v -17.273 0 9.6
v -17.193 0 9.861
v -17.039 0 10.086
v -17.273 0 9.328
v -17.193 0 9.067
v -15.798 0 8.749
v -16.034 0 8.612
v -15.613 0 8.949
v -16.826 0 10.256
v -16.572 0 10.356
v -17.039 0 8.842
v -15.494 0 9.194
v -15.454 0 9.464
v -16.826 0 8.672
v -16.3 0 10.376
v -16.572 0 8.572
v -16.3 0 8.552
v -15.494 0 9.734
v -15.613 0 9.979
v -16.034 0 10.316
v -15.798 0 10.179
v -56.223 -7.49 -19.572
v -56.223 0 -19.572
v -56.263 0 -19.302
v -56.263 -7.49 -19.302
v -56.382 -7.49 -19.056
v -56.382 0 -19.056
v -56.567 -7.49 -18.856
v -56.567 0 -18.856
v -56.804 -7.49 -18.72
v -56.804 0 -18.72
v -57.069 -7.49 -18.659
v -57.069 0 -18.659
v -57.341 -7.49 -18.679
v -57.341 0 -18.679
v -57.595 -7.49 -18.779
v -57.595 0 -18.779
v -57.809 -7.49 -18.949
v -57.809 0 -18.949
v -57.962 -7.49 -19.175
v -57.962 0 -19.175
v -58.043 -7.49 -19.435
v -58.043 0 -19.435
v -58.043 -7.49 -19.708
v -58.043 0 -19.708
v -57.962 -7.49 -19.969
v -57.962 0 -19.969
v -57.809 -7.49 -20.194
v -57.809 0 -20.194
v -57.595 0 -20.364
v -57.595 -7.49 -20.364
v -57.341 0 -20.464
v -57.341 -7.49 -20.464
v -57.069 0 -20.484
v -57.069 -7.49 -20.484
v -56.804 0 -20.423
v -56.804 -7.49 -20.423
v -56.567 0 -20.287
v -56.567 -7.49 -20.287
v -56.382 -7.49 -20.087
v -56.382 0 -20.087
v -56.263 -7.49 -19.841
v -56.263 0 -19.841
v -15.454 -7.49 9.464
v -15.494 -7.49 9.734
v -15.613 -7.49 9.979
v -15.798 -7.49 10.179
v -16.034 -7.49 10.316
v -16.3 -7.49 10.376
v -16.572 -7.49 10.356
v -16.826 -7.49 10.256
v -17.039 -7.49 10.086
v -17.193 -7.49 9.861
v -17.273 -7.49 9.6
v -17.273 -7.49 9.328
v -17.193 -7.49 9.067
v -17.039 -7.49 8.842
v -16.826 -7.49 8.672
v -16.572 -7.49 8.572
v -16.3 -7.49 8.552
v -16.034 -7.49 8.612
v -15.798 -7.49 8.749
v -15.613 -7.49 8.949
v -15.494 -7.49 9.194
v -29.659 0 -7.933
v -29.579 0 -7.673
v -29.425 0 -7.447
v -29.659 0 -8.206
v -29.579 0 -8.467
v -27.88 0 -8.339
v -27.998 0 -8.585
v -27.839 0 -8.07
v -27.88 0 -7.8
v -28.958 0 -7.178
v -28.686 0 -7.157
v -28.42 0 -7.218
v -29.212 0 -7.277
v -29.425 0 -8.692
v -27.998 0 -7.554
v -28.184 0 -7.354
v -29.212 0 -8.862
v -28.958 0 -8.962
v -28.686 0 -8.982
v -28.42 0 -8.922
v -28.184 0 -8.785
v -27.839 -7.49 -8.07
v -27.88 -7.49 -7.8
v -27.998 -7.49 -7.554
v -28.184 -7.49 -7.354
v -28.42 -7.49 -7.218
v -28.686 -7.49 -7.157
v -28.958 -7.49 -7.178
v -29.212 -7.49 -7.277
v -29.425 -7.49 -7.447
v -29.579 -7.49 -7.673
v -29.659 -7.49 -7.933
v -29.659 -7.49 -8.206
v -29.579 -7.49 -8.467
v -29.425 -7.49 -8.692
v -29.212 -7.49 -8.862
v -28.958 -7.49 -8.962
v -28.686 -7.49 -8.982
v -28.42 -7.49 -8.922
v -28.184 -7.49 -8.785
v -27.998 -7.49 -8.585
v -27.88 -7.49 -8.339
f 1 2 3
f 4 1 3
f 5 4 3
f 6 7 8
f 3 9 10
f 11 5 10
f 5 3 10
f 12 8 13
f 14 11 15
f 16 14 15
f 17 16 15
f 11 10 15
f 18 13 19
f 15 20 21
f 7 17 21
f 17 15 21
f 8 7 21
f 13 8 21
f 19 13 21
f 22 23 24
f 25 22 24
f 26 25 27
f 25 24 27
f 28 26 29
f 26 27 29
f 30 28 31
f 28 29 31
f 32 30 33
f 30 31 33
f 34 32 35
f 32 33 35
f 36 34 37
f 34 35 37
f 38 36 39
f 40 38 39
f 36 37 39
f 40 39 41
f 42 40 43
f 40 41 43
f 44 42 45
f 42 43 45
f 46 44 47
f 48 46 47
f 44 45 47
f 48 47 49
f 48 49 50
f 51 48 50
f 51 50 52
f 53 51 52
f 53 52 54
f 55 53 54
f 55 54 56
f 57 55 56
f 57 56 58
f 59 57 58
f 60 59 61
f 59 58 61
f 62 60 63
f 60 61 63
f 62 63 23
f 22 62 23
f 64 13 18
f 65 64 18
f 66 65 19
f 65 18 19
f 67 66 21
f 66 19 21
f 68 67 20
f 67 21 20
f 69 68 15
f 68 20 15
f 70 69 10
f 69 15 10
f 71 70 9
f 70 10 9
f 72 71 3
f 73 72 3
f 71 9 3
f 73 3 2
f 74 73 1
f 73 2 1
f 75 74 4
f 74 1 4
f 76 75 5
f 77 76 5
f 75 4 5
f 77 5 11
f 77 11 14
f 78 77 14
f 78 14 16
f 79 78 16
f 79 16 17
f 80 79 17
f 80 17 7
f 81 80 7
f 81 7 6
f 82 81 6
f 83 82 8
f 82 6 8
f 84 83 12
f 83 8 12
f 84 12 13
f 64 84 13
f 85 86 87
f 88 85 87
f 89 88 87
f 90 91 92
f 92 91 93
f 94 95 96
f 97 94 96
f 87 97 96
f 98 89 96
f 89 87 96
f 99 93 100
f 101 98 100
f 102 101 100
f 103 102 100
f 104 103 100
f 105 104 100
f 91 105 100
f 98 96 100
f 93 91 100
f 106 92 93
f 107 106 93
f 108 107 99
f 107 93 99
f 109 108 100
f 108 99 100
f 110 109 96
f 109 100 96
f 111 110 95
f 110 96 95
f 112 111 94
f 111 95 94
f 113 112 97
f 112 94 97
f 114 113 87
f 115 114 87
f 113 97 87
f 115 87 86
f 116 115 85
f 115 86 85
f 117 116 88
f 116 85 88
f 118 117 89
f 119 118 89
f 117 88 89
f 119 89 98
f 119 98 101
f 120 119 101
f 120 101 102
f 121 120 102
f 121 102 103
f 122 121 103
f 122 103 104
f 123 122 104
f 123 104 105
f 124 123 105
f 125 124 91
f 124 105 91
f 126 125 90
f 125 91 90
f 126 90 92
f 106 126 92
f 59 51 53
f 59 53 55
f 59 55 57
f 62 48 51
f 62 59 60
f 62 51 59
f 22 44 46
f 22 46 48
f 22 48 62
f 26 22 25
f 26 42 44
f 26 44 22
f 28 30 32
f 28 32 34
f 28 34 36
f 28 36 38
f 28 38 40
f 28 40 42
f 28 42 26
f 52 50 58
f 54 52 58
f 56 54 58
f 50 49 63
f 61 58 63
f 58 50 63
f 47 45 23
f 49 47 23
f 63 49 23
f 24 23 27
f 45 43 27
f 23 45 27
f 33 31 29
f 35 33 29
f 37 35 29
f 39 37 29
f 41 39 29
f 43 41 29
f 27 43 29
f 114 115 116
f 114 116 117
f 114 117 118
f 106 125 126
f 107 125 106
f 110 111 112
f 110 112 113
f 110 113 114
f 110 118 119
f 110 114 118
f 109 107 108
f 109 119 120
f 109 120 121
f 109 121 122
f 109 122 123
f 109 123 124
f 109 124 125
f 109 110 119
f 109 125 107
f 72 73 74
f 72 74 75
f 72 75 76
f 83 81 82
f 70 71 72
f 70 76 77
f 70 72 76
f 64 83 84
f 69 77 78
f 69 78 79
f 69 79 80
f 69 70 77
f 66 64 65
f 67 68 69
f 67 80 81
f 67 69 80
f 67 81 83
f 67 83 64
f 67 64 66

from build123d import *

# Parameters (mm, degrees)
F0_R     = 0.915
F1_DEPTH = 7.49
F2_R     = 0.915
F3_DEPTH = 7.49
F4_DEPTH = 7.49


with BuildPart() as f1:
    # F0 (on Front) → F1 (new body)
    with BuildSketch(Plane.XZ):
        with Locations((-16.368549, 9.46405)):
            Circle(F0_R)
    extrude(amount=F1_DEPTH)


with BuildPart() as f3:
    # F2 (on Front) → F3 (new body)
    with BuildSketch(Plane.XZ):
        with Locations((-28.754417, -8.069788)):
            Circle(F2_R)
    extrude(amount=F3_DEPTH)


with BuildPart() as f4:
    # F0 (on Front) → F4 (new body)
    with BuildSketch(Plane.XZ):
        with Locations((-57.13781, -19.571556)):
            Circle(F0_R)
    extrude(amount=F4_DEPTH)


solid = Compound([f1.part, f3.part, f4.part])
